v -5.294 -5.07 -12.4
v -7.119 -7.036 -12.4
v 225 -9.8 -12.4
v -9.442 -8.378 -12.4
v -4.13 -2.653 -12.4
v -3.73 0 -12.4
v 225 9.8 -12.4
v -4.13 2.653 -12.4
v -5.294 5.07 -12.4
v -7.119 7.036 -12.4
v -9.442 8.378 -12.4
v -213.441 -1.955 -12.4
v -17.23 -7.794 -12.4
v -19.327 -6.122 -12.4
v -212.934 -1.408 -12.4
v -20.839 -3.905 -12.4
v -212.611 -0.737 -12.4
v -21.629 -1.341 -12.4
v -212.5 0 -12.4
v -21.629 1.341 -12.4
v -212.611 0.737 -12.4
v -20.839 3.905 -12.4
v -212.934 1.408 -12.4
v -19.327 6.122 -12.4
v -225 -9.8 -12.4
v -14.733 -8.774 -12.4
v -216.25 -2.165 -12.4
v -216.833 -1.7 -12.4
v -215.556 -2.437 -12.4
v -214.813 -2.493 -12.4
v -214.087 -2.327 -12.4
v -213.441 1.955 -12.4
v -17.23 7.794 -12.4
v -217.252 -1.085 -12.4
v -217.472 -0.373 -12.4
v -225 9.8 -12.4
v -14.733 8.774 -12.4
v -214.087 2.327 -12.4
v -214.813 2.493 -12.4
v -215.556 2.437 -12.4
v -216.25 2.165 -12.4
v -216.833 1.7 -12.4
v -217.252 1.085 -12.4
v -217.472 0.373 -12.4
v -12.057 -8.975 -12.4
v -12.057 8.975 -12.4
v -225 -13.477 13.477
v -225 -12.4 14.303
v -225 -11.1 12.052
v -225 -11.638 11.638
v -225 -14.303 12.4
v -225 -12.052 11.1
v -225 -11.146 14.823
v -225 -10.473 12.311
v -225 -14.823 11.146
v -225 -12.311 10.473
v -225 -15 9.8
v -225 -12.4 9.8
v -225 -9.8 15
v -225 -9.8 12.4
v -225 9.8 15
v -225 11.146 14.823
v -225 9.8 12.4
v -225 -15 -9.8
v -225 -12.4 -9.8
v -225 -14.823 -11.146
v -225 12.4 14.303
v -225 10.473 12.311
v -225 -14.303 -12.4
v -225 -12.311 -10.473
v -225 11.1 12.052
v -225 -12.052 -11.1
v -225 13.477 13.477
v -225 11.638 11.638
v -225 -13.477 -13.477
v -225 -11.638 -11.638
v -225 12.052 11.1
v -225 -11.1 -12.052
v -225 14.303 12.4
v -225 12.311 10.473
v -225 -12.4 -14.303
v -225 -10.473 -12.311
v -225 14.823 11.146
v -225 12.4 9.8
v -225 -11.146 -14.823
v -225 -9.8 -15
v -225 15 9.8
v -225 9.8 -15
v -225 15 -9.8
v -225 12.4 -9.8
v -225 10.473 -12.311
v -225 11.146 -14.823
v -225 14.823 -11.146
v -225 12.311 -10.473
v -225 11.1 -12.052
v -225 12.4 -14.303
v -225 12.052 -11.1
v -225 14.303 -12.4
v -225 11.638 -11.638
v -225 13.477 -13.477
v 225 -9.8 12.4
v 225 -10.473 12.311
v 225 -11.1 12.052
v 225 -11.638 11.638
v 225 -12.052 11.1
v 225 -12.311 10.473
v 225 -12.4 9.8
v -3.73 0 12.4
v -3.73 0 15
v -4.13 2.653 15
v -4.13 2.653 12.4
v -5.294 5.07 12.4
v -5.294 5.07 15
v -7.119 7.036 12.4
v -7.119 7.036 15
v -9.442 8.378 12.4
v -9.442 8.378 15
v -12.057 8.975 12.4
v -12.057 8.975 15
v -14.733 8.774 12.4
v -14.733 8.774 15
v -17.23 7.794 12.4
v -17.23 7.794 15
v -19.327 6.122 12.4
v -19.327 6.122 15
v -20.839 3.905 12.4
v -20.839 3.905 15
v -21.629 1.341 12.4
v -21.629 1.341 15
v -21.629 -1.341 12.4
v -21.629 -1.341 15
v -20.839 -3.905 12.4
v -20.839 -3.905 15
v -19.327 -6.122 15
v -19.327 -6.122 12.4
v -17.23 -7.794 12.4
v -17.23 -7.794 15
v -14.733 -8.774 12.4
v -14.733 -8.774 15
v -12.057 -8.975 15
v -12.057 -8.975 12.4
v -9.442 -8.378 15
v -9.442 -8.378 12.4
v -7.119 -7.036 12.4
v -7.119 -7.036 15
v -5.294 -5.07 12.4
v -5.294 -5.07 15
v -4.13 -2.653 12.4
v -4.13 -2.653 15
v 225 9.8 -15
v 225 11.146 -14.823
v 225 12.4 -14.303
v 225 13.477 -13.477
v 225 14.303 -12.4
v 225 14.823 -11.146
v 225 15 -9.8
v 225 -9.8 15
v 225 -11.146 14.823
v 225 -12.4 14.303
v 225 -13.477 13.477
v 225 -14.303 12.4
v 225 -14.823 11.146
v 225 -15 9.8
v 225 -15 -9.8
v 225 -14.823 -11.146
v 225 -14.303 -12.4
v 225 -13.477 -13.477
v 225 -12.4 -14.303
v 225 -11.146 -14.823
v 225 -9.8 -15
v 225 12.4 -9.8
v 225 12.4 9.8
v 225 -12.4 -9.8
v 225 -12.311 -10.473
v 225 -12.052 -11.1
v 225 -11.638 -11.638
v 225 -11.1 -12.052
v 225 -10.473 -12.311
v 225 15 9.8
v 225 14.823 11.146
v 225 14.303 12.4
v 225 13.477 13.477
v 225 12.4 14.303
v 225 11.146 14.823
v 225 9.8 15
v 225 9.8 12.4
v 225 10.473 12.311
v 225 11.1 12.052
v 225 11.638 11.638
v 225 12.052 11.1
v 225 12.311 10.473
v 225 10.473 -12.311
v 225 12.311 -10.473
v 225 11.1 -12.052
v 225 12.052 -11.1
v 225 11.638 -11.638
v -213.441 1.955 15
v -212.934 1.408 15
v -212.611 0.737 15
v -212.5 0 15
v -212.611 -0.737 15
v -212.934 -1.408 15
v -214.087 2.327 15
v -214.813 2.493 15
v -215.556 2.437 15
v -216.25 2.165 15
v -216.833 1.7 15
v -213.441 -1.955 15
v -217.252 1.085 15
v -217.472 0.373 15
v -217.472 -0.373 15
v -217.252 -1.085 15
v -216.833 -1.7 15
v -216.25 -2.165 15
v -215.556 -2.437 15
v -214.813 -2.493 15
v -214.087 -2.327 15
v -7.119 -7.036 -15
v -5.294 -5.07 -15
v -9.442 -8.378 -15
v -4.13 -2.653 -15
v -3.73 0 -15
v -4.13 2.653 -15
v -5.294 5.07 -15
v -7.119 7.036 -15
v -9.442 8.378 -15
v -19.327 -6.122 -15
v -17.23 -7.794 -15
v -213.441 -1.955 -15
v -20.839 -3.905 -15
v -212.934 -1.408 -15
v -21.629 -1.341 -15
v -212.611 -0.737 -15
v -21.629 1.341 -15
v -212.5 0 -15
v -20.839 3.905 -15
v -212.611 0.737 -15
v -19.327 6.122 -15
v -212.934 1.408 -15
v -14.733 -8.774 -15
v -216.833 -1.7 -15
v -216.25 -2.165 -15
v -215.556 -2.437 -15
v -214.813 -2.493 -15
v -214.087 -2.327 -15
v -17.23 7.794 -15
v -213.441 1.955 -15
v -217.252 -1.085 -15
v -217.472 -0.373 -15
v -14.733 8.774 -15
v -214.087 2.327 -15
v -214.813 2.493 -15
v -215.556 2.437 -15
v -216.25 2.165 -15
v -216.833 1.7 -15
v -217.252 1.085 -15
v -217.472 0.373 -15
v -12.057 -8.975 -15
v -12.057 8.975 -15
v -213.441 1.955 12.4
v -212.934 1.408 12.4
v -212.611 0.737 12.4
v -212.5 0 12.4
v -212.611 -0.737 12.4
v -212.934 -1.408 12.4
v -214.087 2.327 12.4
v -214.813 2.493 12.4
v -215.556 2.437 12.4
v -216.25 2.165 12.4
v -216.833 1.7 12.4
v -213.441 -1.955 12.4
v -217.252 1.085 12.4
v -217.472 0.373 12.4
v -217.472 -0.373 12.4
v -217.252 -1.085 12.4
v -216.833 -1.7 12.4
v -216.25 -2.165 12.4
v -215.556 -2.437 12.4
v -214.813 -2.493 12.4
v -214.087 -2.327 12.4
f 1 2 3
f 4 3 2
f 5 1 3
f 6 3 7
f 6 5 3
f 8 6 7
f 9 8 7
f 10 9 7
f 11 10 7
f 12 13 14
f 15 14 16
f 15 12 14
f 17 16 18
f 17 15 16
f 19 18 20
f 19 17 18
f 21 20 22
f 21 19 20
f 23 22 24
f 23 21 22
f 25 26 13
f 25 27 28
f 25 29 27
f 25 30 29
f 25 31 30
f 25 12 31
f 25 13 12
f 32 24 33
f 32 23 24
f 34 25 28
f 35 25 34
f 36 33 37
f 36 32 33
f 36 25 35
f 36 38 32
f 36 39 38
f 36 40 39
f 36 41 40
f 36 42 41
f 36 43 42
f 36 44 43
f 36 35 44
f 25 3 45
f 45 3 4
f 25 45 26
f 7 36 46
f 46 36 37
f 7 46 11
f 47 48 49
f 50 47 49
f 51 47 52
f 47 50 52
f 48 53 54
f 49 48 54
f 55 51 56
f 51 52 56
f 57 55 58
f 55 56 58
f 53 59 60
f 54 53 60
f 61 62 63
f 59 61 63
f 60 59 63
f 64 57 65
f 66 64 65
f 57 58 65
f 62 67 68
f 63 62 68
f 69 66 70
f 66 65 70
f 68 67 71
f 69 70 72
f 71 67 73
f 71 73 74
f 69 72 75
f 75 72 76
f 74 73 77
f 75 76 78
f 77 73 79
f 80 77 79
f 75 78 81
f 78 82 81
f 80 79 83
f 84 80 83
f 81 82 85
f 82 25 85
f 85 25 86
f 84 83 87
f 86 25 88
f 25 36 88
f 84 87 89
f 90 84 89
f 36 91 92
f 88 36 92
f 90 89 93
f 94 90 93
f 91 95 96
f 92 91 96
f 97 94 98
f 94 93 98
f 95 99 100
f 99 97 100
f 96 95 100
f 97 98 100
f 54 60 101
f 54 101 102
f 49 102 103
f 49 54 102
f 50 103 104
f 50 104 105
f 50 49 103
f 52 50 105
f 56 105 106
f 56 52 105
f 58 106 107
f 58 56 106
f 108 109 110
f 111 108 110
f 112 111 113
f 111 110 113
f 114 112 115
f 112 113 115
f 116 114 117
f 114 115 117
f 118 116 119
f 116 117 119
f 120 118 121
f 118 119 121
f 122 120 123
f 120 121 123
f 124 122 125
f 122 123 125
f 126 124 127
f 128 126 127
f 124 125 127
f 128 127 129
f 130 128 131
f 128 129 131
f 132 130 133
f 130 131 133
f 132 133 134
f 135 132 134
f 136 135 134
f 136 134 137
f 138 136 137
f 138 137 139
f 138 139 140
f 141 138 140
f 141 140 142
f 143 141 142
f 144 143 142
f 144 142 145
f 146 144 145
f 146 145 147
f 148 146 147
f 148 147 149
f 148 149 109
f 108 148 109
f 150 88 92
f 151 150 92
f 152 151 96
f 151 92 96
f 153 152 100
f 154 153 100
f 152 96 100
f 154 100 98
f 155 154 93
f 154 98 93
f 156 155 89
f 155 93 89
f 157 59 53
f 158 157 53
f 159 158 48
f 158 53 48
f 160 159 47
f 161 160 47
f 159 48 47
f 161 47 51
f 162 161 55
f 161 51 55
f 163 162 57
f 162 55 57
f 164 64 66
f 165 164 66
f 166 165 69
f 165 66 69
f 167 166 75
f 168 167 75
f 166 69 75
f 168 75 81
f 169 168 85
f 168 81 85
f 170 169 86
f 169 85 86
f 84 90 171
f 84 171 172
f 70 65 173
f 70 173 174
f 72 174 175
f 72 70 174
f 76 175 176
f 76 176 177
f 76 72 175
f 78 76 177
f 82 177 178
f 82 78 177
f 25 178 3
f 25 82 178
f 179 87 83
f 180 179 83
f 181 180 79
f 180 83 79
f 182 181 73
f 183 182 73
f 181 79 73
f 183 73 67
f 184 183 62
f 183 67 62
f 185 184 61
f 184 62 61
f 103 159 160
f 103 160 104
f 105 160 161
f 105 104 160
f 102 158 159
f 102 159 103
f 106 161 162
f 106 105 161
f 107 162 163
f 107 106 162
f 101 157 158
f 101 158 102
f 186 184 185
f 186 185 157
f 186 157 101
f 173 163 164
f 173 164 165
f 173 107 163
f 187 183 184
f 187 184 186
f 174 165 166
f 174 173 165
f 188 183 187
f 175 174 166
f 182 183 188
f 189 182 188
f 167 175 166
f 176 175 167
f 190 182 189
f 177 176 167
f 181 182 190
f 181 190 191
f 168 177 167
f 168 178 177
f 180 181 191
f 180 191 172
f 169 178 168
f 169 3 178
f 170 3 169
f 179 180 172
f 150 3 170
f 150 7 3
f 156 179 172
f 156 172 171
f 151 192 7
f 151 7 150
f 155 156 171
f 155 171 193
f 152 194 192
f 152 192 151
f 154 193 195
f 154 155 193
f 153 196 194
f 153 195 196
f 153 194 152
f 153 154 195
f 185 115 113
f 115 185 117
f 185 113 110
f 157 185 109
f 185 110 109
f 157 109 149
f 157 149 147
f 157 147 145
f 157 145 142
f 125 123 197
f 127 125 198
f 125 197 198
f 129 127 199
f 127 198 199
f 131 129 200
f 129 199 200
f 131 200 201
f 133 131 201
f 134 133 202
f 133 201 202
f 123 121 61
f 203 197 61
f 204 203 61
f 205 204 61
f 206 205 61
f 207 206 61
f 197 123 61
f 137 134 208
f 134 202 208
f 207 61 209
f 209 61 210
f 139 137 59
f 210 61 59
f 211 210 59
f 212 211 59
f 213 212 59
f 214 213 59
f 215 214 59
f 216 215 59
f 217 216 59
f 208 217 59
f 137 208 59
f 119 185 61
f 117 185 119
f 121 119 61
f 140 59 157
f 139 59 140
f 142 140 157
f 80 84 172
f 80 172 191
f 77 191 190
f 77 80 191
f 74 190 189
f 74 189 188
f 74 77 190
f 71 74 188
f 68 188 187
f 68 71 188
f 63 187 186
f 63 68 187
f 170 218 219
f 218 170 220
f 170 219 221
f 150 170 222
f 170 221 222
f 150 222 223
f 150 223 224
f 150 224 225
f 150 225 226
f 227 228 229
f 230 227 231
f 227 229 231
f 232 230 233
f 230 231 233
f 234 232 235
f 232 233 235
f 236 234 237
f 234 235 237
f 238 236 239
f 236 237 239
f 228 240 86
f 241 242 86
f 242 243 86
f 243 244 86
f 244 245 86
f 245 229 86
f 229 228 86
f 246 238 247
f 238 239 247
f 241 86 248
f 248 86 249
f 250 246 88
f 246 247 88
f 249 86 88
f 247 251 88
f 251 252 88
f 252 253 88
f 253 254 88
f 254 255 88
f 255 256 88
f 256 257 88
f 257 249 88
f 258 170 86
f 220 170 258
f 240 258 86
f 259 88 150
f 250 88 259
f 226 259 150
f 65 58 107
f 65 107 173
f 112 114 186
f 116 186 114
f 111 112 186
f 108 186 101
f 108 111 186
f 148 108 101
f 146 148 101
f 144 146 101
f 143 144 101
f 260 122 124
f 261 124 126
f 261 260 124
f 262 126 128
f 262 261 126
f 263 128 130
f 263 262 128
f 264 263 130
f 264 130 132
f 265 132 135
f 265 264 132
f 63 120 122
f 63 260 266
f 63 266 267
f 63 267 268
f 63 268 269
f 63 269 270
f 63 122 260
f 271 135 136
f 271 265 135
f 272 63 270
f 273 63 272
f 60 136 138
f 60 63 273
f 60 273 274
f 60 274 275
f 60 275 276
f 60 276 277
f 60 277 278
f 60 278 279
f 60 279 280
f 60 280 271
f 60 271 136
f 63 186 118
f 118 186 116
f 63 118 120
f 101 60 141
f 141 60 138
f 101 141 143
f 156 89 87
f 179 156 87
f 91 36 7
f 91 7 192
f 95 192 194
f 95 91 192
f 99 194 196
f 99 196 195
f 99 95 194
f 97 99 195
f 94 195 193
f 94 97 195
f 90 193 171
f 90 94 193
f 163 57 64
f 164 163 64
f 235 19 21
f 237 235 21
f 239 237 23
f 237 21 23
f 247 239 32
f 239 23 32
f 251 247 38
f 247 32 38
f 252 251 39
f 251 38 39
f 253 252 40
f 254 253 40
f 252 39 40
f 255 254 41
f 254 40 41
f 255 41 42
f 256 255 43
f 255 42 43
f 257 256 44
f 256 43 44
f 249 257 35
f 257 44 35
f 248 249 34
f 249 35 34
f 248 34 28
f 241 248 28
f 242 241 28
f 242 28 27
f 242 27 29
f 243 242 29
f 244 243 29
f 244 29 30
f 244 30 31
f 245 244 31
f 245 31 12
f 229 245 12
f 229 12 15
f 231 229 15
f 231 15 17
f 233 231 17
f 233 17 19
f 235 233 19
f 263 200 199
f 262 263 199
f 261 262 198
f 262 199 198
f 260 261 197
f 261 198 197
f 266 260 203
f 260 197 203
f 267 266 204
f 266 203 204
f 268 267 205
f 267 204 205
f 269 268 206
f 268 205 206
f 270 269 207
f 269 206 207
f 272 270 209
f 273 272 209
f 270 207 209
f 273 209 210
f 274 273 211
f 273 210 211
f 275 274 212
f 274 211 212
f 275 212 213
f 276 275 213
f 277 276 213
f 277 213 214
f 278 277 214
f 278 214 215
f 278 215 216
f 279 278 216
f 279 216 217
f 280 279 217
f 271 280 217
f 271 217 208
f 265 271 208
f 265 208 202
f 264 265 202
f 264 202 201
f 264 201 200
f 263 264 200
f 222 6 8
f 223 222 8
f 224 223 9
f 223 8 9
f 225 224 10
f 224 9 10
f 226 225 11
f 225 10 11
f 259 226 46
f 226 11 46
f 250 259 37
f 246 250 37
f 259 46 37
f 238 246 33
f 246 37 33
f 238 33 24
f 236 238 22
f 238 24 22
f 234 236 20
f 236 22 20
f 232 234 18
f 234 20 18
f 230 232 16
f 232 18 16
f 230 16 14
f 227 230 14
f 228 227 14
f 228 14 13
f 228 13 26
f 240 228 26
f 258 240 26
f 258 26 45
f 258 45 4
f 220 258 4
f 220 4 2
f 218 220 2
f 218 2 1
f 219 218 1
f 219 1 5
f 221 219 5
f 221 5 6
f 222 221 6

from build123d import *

# Parameters (mm, degrees)
RURA_KWADRATOWA_30_X_30_X_2_6_1_DEPTH = 450
SZKIC2_R                              = 2.5
SZKIC2_R_2                            = 9
WYTNIJ_WYCI_GNI_CIE1_DEPTH            = 228.486263322


with BuildPart() as part:
    # Sketch1 → Rura kwadratowa 30 X 30 X 2.6(1) (new body)
    with BuildSketch(Plane(origin=(-225, 0, 0), x_dir=(0, 0, -1), z_dir=(1, 0, 0))):
        with BuildLine():
            Line((-9.8, -15), (9.8, -15))
            ThreePointArc((9.8, -15), (13.476955262, -13.476955262), (15, -9.8))
            Line((15, -9.8), (15, 9.8))
            ThreePointArc((15, 9.8), (13.476955262, 13.476955262), (9.8, 15))
            Line((9.8, 15), (-9.8, 15))
            ThreePointArc((-9.8, 15), (-13.476955262, 13.476955262), (-15, 9.8))
            Line((-15, 9.8), (-15, -9.8))
            ThreePointArc((-15, -9.8), (-13.476955262, -13.476955262), (-9.8, -15))
        make_face()
        with BuildLine():
            Line((-9.8, -12.4), (9.8, -12.4))
            ThreePointArc((9.8, -12.4), (11.638477631, -11.638477631), (12.4, -9.8))
            Line((12.4, -9.8), (12.4, 9.8))
            ThreePointArc((12.4, 9.8), (11.638477631, 11.638477631), (9.8, 12.4))
            Line((9.8, 12.4), (-9.8, 12.4))
            ThreePointArc((-9.8, 12.4), (-11.638477631, 11.638477631), (-12.4, 9.8))
            Line((-12.4, 9.8), (-12.4, -9.8))
            ThreePointArc((-12.4, -9.8), (-11.638477631, -11.638477631), (-9.8, -12.4))
        make_face(mode=Mode.SUBTRACT)
    extrude(amount=RURA_KWADRATOWA_30_X_30_X_2_6_1_DEPTH)

    # Szkic2 → Wytnij-wyciągnięcie1 (cut, through all)
    with BuildSketch(Plane.XY.offset(15)):
        with Locations((-215, 0)):
            Circle(SZKIC2_R)
        with Locations((-12.73, 0)):
            Circle(SZKIC2_R_2)
    extrude(amount=-WYTNIJ_WYCI_GNI_CIE1_DEPTH, mode=Mode.SUBTRACT)


solid = part.part
